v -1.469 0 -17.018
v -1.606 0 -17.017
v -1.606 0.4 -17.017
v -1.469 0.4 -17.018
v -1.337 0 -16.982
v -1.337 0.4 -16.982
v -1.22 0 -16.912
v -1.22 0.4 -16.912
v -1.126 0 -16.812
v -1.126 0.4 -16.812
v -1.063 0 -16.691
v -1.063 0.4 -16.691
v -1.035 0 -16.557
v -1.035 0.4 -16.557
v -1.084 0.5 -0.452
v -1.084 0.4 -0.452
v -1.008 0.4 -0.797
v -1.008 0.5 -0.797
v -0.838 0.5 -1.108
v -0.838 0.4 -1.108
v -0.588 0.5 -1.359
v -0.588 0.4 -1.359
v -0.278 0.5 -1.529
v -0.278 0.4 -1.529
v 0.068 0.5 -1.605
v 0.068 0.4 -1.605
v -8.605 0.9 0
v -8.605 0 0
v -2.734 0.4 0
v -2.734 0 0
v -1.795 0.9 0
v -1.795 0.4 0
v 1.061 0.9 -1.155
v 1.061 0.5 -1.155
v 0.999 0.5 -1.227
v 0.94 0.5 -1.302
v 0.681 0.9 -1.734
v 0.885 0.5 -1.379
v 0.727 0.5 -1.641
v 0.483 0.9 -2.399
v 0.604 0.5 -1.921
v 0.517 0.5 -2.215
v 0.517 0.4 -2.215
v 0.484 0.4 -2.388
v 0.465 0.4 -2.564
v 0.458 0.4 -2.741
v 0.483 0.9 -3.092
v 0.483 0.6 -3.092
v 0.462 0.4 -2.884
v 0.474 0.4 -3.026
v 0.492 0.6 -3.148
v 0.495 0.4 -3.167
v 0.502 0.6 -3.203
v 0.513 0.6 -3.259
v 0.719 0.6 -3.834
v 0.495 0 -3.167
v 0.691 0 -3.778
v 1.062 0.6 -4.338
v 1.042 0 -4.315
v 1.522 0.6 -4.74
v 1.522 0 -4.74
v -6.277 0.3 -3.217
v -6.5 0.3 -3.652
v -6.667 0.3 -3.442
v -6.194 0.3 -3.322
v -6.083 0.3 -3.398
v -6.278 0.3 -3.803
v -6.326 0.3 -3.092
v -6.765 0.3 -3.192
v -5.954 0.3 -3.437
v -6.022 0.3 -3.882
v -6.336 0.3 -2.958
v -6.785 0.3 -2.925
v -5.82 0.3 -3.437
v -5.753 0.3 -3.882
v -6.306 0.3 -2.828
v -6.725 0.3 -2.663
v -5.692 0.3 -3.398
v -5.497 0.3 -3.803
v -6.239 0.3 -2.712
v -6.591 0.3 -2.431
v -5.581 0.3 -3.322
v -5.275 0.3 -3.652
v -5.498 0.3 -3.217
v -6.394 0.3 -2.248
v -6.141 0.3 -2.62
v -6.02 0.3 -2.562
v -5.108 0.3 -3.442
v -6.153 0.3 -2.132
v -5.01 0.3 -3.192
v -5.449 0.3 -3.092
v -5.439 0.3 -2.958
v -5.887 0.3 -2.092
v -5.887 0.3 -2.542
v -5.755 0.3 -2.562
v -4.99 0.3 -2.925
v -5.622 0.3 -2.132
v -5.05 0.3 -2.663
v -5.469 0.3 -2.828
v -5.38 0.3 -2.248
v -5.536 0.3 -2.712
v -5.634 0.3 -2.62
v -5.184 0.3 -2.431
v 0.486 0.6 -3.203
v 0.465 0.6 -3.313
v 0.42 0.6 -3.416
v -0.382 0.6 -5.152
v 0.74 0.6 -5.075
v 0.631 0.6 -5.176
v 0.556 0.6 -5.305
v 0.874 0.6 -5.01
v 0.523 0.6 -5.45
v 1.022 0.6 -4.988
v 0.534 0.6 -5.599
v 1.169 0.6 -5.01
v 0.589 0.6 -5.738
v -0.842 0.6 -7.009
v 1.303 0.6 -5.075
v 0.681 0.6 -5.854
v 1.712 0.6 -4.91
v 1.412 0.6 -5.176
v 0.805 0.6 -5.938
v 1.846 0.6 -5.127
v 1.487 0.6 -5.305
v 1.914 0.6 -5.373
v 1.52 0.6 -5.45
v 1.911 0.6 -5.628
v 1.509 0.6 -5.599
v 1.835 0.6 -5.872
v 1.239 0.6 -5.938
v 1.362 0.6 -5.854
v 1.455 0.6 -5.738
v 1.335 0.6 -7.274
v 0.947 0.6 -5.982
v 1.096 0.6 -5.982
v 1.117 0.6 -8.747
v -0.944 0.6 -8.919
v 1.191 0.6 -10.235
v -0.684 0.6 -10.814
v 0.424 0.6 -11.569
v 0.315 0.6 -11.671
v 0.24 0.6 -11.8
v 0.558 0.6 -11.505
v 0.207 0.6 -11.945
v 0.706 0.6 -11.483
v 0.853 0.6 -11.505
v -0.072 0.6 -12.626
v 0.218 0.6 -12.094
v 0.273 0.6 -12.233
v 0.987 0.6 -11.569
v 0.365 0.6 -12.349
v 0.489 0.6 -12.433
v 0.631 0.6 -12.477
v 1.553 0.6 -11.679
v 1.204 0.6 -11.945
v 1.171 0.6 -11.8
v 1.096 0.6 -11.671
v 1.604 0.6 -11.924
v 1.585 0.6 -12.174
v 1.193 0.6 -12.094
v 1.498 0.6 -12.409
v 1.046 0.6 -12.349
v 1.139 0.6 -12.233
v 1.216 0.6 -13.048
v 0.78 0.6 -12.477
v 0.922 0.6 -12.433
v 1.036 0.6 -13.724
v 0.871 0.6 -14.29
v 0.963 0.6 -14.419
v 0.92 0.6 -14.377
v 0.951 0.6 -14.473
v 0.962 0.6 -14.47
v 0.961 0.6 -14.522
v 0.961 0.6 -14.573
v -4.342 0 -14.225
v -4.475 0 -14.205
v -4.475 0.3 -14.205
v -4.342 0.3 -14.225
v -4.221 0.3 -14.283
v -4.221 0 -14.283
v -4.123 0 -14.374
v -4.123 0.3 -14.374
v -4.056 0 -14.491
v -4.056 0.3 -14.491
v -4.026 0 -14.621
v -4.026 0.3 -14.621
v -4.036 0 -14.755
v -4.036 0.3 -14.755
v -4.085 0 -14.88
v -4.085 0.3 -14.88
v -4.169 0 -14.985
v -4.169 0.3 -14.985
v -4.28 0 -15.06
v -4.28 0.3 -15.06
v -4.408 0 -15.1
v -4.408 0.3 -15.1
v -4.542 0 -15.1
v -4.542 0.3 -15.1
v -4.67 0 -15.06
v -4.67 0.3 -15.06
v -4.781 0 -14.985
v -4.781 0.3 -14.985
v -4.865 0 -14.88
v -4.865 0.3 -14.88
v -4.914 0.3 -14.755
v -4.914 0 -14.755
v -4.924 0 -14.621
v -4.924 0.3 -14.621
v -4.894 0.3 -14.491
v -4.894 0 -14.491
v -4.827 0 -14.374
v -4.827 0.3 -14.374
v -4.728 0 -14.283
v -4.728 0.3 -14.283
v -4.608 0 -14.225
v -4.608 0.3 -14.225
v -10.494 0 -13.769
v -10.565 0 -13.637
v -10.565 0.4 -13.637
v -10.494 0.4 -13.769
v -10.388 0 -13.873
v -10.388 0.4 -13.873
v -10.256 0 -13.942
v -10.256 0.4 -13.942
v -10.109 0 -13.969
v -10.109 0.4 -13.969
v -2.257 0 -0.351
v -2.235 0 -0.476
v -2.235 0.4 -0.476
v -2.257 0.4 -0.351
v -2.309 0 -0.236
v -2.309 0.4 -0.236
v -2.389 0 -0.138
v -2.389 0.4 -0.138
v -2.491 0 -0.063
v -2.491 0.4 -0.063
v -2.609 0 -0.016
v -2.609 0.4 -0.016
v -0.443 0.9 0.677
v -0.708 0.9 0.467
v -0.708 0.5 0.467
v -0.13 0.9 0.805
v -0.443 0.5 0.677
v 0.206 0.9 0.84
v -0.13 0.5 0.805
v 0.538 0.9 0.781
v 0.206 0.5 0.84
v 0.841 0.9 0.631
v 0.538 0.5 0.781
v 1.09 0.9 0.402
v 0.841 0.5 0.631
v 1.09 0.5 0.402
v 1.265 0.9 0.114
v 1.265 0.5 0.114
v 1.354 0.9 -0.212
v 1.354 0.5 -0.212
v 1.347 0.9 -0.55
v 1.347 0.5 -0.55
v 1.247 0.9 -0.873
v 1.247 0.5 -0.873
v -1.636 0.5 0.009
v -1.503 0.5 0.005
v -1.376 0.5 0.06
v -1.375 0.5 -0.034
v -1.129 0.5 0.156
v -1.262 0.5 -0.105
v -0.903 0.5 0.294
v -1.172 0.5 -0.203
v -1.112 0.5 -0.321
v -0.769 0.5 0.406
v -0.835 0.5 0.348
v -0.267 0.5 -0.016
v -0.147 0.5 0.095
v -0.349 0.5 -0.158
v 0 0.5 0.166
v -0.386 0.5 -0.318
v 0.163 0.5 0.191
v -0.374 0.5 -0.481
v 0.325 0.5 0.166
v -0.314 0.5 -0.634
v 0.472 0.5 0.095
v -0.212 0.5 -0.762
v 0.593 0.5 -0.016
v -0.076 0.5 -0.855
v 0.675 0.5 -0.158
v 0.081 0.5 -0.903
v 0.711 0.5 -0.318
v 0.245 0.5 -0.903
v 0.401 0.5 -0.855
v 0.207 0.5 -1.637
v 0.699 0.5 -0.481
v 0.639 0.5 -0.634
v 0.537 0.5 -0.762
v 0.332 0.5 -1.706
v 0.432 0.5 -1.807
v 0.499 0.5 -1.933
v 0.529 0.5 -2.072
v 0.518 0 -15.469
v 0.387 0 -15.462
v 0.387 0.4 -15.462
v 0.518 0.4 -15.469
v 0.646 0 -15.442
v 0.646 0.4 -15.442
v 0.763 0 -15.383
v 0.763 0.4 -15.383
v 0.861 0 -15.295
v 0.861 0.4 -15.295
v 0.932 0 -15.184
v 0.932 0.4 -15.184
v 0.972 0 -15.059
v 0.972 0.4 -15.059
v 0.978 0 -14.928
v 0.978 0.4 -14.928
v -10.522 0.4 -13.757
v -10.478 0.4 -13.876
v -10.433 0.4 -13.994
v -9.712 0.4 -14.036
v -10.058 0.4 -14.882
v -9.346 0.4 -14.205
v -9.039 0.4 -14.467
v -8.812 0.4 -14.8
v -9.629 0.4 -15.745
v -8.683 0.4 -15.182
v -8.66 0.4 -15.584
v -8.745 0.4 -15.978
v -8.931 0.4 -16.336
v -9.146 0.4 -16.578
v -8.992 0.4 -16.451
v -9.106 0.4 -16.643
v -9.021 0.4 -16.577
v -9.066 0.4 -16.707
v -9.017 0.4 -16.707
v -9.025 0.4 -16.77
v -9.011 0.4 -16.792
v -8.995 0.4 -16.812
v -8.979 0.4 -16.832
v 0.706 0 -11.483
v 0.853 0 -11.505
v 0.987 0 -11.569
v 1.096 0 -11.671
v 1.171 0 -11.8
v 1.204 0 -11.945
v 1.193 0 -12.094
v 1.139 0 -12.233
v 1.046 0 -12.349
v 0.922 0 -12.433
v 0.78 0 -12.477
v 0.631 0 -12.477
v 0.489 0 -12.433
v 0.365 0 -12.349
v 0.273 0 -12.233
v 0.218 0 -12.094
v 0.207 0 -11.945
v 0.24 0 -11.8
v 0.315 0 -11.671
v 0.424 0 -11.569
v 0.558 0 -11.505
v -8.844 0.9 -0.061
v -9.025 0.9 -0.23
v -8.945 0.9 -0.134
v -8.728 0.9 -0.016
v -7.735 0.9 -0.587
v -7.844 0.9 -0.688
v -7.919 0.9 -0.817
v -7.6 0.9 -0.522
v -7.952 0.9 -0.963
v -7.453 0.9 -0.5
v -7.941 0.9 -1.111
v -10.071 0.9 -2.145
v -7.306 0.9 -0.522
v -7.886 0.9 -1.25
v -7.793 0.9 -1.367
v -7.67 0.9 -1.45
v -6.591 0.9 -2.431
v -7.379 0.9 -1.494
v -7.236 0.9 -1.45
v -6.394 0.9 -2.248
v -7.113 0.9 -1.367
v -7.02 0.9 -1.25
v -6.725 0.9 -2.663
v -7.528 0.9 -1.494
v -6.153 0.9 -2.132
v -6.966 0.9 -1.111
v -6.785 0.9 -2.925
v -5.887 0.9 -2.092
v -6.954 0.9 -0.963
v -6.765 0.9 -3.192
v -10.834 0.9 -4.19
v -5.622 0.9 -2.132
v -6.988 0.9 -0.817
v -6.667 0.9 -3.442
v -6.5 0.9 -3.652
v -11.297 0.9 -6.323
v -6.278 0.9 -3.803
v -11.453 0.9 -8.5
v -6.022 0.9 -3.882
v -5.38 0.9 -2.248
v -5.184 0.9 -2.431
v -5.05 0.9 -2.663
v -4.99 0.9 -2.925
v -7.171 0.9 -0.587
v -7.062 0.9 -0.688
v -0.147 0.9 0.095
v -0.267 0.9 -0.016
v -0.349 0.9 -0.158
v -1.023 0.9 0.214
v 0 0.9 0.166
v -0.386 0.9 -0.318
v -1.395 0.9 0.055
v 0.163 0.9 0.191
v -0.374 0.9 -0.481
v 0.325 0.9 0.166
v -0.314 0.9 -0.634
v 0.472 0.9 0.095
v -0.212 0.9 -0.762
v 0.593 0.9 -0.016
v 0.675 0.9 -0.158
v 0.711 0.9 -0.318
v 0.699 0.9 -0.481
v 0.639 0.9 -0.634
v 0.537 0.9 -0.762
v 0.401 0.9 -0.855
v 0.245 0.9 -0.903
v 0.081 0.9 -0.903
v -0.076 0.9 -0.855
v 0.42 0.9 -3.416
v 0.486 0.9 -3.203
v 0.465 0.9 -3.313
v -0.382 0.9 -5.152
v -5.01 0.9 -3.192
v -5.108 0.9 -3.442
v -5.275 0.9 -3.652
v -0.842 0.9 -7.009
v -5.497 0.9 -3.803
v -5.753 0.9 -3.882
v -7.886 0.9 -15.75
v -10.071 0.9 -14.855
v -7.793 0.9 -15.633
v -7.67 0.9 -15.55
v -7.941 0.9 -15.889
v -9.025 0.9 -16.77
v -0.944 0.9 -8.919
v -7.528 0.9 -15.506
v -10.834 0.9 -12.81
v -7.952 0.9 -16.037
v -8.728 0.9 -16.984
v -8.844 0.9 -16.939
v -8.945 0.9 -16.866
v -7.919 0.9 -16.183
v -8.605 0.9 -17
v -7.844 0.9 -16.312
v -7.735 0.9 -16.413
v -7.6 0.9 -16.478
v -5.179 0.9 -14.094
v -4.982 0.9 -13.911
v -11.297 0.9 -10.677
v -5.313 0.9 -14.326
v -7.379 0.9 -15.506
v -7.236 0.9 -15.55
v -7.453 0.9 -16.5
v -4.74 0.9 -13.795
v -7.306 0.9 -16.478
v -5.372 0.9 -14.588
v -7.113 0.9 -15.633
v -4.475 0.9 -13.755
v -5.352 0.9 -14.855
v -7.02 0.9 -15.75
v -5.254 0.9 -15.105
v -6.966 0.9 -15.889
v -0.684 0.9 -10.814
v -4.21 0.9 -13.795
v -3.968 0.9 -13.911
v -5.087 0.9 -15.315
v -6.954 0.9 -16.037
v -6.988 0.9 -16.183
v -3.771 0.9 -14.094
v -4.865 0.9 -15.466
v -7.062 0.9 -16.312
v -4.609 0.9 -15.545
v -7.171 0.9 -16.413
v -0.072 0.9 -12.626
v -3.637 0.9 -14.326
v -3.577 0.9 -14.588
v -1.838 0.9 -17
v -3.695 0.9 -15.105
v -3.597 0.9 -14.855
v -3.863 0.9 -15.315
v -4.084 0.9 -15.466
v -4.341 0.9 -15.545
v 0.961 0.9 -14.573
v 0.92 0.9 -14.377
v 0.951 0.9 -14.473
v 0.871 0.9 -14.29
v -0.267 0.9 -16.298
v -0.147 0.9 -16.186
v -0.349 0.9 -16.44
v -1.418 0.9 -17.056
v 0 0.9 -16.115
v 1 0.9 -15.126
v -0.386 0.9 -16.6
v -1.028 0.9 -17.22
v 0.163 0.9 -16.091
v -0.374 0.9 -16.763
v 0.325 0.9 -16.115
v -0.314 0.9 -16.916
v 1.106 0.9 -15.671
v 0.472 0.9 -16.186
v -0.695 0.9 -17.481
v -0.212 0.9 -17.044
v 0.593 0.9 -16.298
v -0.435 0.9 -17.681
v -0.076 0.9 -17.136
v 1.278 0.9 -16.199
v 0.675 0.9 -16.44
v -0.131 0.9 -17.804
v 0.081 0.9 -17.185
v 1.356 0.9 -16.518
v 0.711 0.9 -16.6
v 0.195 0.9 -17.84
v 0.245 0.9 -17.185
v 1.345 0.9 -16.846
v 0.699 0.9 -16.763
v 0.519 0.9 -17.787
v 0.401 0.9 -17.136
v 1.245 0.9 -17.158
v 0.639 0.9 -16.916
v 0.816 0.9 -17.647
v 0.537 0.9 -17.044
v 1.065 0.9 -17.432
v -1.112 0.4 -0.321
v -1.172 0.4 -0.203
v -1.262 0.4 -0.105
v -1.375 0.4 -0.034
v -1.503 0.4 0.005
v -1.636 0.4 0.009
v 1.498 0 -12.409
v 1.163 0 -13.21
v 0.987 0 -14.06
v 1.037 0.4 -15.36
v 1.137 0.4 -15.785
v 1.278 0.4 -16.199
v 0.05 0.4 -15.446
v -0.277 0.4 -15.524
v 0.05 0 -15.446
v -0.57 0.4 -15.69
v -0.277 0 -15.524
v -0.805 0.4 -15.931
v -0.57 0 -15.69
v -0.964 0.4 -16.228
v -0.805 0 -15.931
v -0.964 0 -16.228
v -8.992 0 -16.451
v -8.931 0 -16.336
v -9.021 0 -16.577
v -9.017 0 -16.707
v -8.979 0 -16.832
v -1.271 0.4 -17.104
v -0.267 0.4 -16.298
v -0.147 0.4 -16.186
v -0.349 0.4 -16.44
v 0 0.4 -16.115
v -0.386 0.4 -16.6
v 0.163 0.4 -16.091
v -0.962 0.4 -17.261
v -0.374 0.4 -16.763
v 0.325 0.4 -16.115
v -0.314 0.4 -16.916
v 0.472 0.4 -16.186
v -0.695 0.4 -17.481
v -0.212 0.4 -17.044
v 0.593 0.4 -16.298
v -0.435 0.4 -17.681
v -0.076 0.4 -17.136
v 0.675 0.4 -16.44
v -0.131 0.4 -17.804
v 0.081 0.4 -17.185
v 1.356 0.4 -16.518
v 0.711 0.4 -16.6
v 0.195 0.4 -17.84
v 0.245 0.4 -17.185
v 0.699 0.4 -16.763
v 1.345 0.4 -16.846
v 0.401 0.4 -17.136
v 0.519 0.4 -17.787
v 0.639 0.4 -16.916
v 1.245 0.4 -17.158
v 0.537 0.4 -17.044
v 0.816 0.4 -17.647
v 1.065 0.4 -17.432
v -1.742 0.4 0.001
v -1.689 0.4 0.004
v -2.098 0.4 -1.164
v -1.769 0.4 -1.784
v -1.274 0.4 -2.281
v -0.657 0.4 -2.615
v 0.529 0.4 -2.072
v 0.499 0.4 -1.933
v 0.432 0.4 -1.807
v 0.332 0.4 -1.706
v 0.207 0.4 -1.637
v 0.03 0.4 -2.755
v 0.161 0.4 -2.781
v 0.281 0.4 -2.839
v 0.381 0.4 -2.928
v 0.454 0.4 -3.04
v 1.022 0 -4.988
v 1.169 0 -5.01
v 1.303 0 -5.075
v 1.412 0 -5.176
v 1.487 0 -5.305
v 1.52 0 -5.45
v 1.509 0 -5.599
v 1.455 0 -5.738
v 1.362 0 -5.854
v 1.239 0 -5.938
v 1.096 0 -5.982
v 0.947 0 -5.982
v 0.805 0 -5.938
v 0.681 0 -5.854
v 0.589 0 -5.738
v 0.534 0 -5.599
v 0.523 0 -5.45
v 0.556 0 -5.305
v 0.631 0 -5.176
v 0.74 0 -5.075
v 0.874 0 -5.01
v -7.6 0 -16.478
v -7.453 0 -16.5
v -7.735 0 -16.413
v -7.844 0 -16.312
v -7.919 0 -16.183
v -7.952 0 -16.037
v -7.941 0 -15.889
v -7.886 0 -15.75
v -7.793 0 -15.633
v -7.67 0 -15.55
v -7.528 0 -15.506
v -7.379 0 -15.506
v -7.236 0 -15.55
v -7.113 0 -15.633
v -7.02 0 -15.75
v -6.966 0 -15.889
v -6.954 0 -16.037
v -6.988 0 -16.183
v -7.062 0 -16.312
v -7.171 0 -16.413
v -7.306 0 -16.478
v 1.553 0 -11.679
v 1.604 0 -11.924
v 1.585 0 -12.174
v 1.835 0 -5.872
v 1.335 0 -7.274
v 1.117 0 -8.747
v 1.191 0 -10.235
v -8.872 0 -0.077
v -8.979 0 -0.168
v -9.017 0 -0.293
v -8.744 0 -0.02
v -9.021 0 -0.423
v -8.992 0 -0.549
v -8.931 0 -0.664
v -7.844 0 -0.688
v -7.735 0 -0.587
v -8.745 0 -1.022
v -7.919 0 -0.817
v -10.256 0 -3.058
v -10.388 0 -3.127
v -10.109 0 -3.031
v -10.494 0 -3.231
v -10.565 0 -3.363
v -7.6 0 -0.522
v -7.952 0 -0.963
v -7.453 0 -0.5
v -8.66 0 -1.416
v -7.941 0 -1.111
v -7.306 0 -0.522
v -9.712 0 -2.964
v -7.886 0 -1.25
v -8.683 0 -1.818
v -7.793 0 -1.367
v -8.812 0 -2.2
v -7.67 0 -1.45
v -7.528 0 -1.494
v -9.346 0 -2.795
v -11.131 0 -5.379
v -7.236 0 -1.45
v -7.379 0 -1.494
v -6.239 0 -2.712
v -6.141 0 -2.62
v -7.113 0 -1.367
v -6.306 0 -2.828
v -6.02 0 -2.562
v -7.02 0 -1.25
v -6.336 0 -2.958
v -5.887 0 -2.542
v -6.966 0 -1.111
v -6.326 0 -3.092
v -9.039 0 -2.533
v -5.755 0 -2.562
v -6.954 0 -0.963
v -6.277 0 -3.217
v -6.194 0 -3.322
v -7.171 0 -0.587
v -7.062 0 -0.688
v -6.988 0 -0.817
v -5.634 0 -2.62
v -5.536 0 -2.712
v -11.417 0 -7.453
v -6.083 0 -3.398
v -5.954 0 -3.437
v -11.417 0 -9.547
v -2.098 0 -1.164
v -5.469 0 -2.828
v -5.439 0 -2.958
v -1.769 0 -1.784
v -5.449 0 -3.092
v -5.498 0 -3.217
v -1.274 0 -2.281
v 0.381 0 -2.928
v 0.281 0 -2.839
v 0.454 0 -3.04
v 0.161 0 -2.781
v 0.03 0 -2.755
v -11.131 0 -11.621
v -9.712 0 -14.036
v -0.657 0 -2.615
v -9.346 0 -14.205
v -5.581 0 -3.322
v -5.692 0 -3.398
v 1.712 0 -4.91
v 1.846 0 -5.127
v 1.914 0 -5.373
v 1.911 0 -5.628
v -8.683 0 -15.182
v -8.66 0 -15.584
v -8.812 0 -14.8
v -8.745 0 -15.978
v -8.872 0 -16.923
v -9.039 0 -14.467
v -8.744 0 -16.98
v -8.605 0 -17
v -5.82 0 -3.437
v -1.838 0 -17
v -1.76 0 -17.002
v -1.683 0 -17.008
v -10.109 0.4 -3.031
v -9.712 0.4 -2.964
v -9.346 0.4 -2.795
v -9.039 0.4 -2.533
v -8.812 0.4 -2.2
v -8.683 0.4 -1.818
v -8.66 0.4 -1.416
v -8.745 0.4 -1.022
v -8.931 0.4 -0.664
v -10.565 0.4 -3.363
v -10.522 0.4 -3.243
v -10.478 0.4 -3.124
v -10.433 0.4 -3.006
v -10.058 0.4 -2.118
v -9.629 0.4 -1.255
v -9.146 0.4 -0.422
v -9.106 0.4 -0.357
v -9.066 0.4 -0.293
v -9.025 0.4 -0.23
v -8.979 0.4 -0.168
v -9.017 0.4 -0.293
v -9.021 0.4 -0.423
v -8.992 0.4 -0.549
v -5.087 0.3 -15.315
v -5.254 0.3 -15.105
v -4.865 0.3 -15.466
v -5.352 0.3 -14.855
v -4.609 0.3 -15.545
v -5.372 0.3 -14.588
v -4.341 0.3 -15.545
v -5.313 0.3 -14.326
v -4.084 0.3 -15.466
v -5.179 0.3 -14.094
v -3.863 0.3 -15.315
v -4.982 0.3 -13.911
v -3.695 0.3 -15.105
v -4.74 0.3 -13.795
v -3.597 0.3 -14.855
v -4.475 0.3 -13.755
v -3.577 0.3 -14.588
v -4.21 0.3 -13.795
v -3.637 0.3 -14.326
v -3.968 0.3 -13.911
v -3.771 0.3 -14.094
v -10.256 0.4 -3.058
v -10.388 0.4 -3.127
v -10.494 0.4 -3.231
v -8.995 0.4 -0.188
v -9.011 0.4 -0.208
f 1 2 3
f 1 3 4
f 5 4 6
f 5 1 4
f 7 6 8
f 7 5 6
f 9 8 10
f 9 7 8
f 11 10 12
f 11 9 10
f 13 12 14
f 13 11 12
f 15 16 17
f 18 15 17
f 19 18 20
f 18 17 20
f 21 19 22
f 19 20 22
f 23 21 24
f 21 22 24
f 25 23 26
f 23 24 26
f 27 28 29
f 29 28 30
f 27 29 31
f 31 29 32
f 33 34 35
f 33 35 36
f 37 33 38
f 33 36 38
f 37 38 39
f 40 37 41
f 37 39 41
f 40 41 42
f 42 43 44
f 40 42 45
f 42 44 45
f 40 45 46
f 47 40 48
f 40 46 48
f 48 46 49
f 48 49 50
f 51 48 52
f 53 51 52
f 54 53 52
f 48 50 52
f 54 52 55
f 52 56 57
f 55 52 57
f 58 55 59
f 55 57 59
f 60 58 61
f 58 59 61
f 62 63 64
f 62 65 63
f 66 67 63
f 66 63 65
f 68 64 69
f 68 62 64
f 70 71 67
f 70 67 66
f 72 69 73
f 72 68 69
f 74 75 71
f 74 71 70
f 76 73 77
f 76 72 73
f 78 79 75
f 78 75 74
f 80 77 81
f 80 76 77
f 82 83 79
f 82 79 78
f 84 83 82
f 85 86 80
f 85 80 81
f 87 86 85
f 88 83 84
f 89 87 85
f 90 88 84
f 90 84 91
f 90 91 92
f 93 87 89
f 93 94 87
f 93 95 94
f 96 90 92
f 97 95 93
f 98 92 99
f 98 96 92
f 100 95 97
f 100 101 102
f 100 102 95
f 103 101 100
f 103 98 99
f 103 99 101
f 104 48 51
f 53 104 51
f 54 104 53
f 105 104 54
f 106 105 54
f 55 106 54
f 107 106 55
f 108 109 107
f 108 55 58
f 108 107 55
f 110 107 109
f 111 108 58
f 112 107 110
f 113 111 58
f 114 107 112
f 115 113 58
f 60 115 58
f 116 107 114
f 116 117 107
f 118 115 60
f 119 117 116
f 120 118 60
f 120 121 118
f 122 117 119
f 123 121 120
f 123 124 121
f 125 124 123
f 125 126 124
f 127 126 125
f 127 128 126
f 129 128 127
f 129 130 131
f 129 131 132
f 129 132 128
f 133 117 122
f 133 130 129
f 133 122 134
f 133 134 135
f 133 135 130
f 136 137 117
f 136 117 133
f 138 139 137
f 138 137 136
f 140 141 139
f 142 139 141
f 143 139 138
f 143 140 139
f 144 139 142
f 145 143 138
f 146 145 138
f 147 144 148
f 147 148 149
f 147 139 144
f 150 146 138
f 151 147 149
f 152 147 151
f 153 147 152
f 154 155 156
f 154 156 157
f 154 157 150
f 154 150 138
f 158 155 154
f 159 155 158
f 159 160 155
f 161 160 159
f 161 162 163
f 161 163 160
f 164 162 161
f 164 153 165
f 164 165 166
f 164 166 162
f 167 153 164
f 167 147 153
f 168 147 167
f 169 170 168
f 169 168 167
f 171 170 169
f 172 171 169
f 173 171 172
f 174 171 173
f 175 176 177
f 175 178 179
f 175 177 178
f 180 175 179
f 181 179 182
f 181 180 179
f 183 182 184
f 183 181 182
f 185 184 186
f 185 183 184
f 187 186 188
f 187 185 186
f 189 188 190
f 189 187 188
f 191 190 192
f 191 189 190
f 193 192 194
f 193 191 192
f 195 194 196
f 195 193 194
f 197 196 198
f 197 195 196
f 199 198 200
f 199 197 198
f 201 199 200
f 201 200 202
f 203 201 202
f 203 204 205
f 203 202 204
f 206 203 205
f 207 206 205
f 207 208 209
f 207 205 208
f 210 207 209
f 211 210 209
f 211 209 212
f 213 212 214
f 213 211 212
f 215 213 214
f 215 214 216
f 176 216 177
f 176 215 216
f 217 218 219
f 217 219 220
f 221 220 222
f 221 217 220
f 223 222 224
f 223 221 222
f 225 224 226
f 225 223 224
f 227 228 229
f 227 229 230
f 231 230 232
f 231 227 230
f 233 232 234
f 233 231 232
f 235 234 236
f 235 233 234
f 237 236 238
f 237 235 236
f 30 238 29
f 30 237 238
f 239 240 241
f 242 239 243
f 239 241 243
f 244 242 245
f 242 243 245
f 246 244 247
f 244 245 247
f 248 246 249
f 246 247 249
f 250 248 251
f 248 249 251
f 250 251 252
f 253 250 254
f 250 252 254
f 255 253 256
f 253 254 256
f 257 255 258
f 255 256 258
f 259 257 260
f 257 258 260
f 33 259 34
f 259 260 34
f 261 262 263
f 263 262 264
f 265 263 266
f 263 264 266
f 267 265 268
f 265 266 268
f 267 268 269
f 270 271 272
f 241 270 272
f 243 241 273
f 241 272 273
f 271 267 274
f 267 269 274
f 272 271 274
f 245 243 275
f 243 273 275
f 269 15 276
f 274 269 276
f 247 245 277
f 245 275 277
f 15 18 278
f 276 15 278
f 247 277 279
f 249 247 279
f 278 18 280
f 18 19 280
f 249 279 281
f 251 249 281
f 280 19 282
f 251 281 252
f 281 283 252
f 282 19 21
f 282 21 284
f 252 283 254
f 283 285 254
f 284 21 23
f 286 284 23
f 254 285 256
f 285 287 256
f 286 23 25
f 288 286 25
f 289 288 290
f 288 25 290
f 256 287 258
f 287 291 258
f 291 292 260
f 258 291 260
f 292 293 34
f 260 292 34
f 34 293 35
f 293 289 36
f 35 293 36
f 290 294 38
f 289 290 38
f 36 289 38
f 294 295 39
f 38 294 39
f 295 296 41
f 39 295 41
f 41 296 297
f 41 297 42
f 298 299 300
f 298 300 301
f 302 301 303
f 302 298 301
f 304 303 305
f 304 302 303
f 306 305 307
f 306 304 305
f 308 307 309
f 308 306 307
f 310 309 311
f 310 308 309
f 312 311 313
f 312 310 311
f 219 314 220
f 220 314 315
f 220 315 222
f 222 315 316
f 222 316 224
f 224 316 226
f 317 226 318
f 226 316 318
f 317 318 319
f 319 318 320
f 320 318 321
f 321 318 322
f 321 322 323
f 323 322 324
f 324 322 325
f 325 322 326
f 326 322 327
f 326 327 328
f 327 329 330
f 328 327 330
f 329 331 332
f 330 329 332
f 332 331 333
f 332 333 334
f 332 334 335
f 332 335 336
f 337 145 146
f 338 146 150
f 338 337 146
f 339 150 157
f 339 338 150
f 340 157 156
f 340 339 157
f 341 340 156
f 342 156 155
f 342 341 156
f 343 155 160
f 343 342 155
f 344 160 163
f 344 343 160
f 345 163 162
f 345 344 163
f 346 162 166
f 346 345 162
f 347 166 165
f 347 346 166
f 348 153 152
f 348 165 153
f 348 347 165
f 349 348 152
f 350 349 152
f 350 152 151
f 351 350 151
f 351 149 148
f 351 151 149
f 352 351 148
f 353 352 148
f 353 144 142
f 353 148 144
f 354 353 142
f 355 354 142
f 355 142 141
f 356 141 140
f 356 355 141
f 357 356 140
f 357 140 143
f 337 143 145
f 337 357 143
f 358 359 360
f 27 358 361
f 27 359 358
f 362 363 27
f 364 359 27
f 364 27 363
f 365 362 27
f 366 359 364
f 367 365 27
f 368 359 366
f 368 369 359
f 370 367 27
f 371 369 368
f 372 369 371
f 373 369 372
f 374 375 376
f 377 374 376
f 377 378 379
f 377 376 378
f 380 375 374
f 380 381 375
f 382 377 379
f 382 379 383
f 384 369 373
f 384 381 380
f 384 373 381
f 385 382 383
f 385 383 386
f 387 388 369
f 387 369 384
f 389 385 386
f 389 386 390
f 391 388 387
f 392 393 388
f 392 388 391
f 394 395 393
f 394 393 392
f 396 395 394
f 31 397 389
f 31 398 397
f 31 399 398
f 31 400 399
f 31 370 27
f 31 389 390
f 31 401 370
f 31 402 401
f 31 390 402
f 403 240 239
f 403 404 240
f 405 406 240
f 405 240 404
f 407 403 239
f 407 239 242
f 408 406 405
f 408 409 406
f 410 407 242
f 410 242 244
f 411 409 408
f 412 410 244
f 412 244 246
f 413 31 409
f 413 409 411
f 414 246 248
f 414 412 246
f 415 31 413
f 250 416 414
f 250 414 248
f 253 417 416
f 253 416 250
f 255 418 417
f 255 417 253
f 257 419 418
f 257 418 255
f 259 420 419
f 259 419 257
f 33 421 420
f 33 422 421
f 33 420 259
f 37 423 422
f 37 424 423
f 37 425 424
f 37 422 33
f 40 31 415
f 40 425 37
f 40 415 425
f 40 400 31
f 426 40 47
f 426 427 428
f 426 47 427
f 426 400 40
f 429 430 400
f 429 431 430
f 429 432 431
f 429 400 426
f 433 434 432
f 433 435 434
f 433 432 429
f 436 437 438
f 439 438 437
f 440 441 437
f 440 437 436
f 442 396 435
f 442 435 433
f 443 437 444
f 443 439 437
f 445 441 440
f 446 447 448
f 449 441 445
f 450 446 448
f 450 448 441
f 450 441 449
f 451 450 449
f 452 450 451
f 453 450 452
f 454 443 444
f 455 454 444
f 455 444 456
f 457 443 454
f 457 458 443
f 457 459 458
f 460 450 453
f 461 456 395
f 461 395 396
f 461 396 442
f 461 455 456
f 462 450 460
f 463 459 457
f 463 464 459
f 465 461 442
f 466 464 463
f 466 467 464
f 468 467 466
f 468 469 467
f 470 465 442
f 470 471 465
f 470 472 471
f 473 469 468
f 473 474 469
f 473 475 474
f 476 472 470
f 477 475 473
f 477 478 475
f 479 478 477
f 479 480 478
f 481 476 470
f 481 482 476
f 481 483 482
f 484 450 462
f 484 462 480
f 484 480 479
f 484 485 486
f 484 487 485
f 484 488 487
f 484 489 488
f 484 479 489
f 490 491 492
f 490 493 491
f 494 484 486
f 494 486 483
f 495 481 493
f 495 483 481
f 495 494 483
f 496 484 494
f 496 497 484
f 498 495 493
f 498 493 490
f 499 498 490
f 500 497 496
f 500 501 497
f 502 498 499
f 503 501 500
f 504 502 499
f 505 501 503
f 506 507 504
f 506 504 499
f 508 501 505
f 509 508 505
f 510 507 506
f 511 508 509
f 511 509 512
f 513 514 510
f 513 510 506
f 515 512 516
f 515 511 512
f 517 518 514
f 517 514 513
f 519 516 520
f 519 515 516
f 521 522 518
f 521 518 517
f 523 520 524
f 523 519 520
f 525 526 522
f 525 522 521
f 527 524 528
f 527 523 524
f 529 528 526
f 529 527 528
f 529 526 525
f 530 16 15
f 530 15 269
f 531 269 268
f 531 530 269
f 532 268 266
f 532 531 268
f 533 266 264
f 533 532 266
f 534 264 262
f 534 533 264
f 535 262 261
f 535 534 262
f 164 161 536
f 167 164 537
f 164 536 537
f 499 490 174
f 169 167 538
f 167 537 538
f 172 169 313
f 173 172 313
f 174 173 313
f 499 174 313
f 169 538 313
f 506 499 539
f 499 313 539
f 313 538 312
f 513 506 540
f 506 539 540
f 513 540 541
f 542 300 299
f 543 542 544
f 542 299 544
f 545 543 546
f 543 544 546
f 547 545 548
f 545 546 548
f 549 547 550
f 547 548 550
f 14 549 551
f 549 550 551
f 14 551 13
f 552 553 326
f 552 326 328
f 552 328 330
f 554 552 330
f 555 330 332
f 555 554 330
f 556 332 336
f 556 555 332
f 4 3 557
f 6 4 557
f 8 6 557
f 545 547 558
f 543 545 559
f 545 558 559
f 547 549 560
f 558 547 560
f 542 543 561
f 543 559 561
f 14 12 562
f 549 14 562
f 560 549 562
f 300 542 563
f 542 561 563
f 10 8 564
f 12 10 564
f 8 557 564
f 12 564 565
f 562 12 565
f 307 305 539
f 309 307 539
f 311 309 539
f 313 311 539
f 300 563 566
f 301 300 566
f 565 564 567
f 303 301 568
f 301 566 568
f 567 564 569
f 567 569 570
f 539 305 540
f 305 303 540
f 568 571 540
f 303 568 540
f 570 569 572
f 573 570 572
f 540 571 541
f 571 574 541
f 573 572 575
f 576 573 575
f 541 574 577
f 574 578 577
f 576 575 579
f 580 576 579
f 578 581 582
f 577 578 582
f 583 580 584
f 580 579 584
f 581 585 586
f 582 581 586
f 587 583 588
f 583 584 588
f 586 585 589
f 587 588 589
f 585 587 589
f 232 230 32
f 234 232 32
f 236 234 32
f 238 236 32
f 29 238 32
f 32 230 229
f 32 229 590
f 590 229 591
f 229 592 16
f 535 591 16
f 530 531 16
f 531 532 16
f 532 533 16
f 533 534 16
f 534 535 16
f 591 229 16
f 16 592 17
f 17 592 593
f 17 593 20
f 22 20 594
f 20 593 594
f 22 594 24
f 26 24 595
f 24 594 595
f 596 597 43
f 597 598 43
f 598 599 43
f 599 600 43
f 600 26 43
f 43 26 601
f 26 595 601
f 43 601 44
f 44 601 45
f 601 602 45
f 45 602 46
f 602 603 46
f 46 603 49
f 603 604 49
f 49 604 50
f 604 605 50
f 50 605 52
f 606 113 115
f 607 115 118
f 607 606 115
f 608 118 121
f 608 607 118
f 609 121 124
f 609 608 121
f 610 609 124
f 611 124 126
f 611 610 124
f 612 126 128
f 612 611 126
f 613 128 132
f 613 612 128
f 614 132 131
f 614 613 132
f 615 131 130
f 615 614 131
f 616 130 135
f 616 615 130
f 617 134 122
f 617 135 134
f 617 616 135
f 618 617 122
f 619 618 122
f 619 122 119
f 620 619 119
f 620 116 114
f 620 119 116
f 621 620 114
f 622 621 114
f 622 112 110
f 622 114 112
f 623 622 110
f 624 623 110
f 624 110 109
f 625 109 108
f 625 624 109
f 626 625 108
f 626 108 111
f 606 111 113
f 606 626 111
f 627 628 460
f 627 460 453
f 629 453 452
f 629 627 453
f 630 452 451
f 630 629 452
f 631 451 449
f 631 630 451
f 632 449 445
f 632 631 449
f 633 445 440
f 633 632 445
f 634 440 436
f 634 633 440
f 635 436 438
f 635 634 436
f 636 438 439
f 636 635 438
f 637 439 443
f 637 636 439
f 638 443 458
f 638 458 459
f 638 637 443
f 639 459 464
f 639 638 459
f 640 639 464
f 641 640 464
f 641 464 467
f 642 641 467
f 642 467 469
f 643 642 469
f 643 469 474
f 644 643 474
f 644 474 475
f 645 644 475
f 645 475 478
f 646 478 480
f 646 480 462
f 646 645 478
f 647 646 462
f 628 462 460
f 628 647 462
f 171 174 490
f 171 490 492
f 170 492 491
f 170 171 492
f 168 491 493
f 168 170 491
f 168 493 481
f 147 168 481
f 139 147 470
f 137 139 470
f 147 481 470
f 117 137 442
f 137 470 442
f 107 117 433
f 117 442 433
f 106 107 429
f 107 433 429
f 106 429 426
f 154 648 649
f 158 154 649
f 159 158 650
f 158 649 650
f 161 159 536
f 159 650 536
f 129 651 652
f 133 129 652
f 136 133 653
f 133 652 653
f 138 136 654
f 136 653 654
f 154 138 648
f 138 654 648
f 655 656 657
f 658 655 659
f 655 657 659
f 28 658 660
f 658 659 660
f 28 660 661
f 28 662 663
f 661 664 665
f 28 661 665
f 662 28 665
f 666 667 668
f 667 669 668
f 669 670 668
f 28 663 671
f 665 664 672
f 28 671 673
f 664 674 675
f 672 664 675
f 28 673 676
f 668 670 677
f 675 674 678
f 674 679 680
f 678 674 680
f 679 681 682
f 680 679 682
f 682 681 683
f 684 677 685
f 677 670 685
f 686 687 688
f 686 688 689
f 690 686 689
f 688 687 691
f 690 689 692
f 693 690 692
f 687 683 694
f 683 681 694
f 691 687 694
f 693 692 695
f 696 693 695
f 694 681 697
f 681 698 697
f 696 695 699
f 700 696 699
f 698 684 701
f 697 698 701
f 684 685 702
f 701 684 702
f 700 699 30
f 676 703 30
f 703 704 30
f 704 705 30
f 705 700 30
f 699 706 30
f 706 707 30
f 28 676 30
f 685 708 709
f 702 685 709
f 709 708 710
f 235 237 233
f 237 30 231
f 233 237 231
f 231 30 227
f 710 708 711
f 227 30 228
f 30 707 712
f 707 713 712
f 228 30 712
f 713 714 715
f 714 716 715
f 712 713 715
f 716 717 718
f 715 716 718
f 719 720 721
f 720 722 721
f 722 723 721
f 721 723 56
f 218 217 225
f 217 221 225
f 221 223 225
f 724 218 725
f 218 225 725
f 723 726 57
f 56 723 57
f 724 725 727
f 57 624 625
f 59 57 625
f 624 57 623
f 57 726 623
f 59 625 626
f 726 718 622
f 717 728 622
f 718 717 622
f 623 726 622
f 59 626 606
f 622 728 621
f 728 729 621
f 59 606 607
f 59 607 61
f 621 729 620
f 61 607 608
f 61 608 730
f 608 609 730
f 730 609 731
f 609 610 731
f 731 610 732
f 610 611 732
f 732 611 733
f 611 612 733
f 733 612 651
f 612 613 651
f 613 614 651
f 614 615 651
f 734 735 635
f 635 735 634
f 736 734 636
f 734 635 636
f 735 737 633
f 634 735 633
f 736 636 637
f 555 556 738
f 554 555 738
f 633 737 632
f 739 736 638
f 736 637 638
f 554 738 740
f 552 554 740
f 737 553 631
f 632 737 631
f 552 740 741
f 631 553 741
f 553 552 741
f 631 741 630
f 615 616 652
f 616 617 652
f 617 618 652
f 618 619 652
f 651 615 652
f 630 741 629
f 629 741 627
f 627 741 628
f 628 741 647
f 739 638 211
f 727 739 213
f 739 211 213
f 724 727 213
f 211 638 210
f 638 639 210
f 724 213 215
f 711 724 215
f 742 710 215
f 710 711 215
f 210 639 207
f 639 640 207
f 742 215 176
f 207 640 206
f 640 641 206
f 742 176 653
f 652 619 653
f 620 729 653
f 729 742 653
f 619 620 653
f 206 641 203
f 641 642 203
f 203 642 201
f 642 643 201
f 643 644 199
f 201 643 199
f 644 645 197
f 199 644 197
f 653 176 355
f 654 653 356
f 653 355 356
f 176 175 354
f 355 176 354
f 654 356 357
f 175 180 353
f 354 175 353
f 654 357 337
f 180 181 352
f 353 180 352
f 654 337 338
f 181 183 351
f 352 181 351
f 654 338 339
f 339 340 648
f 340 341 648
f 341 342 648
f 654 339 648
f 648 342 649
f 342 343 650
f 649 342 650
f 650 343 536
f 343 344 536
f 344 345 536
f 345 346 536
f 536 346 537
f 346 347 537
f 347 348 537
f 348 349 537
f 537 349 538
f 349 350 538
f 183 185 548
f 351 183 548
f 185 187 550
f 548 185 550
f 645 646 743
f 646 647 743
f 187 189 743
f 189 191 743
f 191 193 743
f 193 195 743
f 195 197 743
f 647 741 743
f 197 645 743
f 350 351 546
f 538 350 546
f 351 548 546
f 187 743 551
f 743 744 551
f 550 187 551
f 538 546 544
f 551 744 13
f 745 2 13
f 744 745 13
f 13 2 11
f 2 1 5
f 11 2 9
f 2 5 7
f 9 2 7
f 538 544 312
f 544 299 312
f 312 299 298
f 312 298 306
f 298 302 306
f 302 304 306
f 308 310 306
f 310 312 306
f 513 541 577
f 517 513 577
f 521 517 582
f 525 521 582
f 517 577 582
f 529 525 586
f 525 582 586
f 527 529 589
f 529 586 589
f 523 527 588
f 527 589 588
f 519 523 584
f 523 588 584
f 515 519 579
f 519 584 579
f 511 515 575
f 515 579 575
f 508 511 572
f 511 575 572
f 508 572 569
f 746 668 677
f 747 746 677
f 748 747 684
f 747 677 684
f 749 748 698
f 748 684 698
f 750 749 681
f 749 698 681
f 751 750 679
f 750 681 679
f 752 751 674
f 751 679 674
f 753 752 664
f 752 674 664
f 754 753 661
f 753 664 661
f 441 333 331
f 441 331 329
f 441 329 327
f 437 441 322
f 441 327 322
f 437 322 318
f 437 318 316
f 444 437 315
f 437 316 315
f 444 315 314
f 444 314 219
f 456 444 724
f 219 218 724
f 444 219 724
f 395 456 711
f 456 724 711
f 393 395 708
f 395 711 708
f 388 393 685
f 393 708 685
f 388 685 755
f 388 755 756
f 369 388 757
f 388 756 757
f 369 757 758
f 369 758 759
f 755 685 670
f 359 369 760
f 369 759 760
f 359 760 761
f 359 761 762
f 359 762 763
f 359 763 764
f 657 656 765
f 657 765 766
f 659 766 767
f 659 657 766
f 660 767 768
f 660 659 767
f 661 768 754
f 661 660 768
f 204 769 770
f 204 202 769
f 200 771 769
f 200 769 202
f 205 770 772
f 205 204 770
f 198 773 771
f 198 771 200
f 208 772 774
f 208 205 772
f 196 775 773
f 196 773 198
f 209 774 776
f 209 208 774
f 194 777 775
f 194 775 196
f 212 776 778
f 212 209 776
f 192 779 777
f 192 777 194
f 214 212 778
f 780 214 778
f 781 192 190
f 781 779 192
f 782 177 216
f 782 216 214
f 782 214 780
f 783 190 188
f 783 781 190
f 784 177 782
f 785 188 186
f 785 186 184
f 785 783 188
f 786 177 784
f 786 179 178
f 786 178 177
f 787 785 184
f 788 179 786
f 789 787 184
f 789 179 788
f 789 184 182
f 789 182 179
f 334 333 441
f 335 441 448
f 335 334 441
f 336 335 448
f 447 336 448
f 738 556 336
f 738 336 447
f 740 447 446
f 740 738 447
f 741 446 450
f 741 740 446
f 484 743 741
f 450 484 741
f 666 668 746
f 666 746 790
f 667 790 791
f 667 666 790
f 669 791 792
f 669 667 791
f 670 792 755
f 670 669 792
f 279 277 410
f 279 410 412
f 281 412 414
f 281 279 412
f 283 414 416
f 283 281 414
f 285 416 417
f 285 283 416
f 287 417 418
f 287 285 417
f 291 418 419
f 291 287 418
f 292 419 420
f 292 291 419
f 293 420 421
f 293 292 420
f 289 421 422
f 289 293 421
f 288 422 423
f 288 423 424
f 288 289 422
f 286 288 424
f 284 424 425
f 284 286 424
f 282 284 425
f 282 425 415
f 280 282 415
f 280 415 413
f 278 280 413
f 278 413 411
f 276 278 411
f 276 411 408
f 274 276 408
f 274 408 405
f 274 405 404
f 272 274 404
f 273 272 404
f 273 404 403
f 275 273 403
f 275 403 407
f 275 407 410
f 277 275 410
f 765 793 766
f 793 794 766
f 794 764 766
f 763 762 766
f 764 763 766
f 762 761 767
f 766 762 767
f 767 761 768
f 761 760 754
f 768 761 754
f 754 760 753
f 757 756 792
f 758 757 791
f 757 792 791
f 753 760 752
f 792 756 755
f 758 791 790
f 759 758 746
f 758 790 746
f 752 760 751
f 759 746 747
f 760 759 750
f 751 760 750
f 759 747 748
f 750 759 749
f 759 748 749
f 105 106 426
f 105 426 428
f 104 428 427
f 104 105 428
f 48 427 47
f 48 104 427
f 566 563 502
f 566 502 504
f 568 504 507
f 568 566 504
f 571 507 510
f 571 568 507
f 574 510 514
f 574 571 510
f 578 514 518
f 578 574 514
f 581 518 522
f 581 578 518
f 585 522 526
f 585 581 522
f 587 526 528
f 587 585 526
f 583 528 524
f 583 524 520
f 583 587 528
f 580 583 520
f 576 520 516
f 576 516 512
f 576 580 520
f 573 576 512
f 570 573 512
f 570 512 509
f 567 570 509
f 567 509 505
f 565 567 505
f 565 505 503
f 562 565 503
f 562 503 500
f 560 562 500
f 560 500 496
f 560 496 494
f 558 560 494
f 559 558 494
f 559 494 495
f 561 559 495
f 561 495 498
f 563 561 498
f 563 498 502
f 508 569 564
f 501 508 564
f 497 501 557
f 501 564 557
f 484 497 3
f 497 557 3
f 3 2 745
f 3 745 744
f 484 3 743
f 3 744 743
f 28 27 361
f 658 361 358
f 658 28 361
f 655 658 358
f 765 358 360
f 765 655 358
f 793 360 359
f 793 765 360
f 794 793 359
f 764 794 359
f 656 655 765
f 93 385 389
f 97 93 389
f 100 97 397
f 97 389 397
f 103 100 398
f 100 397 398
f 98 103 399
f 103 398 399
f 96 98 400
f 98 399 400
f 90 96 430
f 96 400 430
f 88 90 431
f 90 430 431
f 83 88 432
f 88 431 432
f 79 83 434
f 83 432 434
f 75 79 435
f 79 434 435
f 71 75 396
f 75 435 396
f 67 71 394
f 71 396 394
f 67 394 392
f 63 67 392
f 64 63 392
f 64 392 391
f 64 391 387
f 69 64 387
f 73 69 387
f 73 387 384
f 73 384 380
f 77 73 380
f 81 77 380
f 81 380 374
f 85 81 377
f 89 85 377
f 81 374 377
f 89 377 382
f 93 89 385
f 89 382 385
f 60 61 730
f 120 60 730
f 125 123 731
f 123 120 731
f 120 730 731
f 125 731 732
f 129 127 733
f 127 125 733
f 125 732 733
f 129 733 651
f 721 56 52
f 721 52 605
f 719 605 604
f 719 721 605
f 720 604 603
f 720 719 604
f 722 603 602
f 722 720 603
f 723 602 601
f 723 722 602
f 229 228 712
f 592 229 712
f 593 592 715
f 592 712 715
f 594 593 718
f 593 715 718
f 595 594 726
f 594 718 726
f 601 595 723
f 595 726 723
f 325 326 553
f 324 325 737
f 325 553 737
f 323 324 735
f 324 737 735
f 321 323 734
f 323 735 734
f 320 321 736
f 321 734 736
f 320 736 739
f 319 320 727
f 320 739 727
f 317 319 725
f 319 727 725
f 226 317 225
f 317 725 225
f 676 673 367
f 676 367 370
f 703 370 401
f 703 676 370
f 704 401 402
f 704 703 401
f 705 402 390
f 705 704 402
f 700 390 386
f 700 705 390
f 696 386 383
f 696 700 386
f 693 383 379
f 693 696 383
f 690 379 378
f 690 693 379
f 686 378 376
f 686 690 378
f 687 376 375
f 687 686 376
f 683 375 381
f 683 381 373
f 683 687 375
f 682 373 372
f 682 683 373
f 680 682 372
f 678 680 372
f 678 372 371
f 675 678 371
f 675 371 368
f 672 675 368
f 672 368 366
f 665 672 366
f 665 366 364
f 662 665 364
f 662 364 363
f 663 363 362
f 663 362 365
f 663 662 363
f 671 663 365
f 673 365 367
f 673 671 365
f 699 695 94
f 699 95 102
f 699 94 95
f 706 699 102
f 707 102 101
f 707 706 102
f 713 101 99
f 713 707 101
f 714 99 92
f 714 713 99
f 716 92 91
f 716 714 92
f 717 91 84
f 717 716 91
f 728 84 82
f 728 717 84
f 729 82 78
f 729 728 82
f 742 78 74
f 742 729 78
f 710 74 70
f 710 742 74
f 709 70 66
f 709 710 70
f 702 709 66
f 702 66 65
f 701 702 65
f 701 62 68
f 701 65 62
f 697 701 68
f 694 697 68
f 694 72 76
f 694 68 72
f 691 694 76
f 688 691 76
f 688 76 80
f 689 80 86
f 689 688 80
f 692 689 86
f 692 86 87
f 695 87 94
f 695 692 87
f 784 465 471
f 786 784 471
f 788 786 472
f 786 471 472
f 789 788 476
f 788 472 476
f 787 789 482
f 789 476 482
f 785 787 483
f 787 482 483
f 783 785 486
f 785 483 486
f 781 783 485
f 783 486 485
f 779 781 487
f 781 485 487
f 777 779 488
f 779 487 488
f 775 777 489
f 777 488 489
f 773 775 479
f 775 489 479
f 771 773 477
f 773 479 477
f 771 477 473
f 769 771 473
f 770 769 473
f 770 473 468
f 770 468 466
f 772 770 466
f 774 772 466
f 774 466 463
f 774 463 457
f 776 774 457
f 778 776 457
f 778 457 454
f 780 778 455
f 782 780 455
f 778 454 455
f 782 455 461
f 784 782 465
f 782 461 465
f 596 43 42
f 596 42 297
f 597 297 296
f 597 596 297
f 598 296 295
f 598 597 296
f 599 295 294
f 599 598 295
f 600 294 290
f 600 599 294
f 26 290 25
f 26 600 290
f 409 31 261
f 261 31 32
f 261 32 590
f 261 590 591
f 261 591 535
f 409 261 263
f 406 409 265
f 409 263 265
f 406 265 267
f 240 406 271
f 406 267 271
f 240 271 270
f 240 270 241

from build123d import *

# Parameters (mm, degrees)
SKETCH_1_R          = 0.5
SKETCH_1_R_2        = 0.55
SKETCH_1_R_3        = 0.45
EXTRUDE_1_DEPTH     = 0.9
SKETCH_2_R          = 10.1
CUT_EXTRUDE_1_DEPTH = 0.3
SKETCH_3_R          = 2.4
SKETCH_3_R_2        = 1.5
CUT_EXTRUDE_2_DEPTH = 0.4
SKETCH_4_R          = 1.25
CUT_EXTRUDE_3_DEPTH = 0.1
SKETCH_5_R          = 0.9
CUT_EXTRUDE_4_DEPTH = 0.6
SKETCH_6_R          = 1.2
CUT_EXTRUDE_5_DEPTH = 0.4
FILLET_START        = -1
FILLET_1_DEPTH      = 1.4
FILLET_START_2      = 0.4
FILLET_1_2_DEPTH    = 0.1
FILLET_START_3      = 0.5
FILLET_1_3_DEPTH    = 1.5
FILLET_START_4      = 0.6
FILLET_1_4_DEPTH    = 1.4


with BuildPart() as part:
    # Эскиз1 → Бобышка-Вытянуть1 (new body)
    with BuildSketch(Plane(origin=(0, 0, 0), x_dir=(1, 0, 0), z_dir=(0, 1, 0))):
        with BuildLine():
            Line((-8.874701271, 0), (-1.795461863, 0))
            ThreePointArc((-1.795461863, 0), (-1.203537037, -0.121731158), (-0.70768647, -0.467166667))
            ThreePointArc((-0.70768647, -0.467166667), (0.973552797, -0.525347996), (1.060942394, 1.154626289))
            ThreePointArc((1.060942394, 1.154626289), (0.477391661, 3.052026669), (1.522351258, 4.739841558))
            ThreePointArc((1.522351258, 4.739841558), (1.889015496, 5.247769663), (1.835416111, 5.871917665))
            ThreePointArc((1.835416111, 5.871917665), (1.116849218, 8.747445681), (1.55283729, 11.679154083))
            ThreePointArc((1.55283729, 11.679154083), (1.603016133, 12.049823116), (1.498169999, 12.408878456))
            ThreePointArc((1.498169999, 12.408878456), (0.968934134, 14.279432184), (1.278077174, 16.198674855))
            ThreePointArc((1.278077174, 16.198674855), (0.816325951, 17.647158357), (-0.694815473, 17.480514286))
            ThreePointArc((-0.694815473, 17.480514286), (-1.217938679, 17.125012349), (-1.837947895, 17))
            Line((-1.837947895, 17), (-8.874701271, 17))
            ThreePointArc((-8.874701271, 17), (-11.453066156, 8.5), (-8.874701271, 0))
        make_face()
        with Locations(Location((1.021573168, 5.487652568, 0), (0, 0, 270))):
            Circle(SKETCH_1_R, mode=Mode.SUBTRACT)
        with Locations(Location((0.162533844, 0.3591, 0), (0, 0, 270))):
            Circle(SKETCH_1_R_2, mode=Mode.SUBTRACT)
        with Locations(Location((-5.887426867, 2.992111817, 0), (0, 0, 270))):
            Circle(SKETCH_1_R_3, mode=Mode.SUBTRACT)
        with Locations(Location((-7.453066156, 1, 0), (0, 0, 270))):
            Circle(SKETCH_1_R, mode=Mode.SUBTRACT)
        with Locations(Location((-4.474879967, 14.65491132, 0), (0, 0, 270))):
            Circle(SKETCH_1_R_3, mode=Mode.SUBTRACT)
        with Locations(Location((-7.453066156, 16, 0), (0, 0, 90))):
            Circle(SKETCH_1_R, mode=Mode.SUBTRACT)
        with Locations(Location((0.705531067, 11.982588035, 0), (0, 0, 270))):
            Circle(SKETCH_1_R, mode=Mode.SUBTRACT)
        with Locations(Location((0.162533844, 16.6409, 0), (0, 0, 270))):
            Circle(SKETCH_1_R_2, mode=Mode.SUBTRACT)
    extrude(amount=EXTRUDE_1_DEPTH)

    # Эскиз2 → Вырез-Вытянуть1 (cut)
    with BuildSketch(Plane(origin=(0, 0.9, 0), x_dir=(1, 0, 0), z_dir=(0, 1, 0))):
        with Locations((9.146933844, 8.5)):
            Circle(SKETCH_2_R)
    extrude(amount=-CUT_EXTRUDE_1_DEPTH, mode=Mode.SUBTRACT)

    # Эскиз3 → Вырез-Вытянуть2 (cut)
    with BuildSketch(Plane.XZ):
        with Locations((0.162533844, -0.3591)):
            Circle(SKETCH_3_R)
        with Locations((-10.155327835, -1.531617514)):
            Circle(SKETCH_3_R_2)
        with Locations((-10.155327835, -15.468382486)):
            Circle(SKETCH_3_R_2)
    extrude(amount=-CUT_EXTRUDE_2_DEPTH, mode=Mode.SUBTRACT)

    # Эскиз4 → Вырез-Вытянуть3 (cut)
    with BuildSketch(Plane.XZ.offset(-0.4)):
        with Locations((0.162533844, -0.3591)):
            Circle(SKETCH_4_R)
    extrude(amount=-CUT_EXTRUDE_3_DEPTH, mode=Mode.SUBTRACT)

    # Эскиз5 → Вырез-Вытянуть4 (cut)
    with BuildSketch(Plane(origin=(0, 0.9, 0), x_dir=(1, 0, 0), z_dir=(0, 1, 0))):
        with Locations(Location((-5.887426867, 2.992111817, 0), (0, 0, 270))):
            Circle(SKETCH_5_R)
        with Locations(Location((-4.474879967, 14.65491132, 0), (0, 0, 270))):
            Circle(SKETCH_5_R)
    extrude(amount=-CUT_EXTRUDE_4_DEPTH, mode=Mode.SUBTRACT)

    # Эскиз6 → Вырез-Вытянуть5 (cut)
    with BuildSketch(Plane.XZ):
        with Locations((0.162533844, -16.6409)):
            Circle(SKETCH_6_R)
    extrude(amount=-CUT_EXTRUDE_5_DEPTH, mode=Mode.SUBTRACT)

    # Скругление1: read off the stored shape, not the designer's step
    # Скругление1 outline → Скругление1 (cut)
    with BuildSketch(Plane(origin=(0, 0, 0), x_dir=(1, 0, 0), z_dir=(0, 1, 0)).offset(FILLET_START)):
        with BuildLine():
            ThreePointArc((-10.564834765, 13.6372099), (-10.388255808, 13.873471068), (-10.10922841, 13.969091039))
            ThreePointArc((-10.10922841, 13.969091039), (-10.271568069, 13.972893199), (-10.432545463, 13.994221577))
            ThreePointArc((-10.432545463, 13.994221577), (-10.499800665, 13.816127249), (-10.564834765, 13.6372099))
        make_face()
        with BuildLine():
            ThreePointArc((-9.146480388, 16.578439614), (-9.032397619, 16.462881218), (-8.931474904, 16.335667907))
            ThreePointArc((-8.931474904, 16.335667907), (-9.021275661, 16.577400508), (-8.978676793, 16.831731322))
            ThreePointArc((-8.978676793, 16.831731322), (-8.809674916, 16.955996525), (-8.604572089, 17))
            Line((-8.604572089, 17), (-8.874701271, 17))
            ThreePointArc((-8.874701271, 17), (-8.950481675, 16.885472917), (-9.025231073, 16.77027027))
            ThreePointArc((-9.025231073, 16.77027027), (-9.086211401, 16.674579749), (-9.146480388, 16.578439614))
        make_face()
        with BuildLine():
            ThreePointArc((-10.10922841, 3.030908961), (-10.388255808, 3.126528932), (-10.564834765, 3.3627901))
            ThreePointArc((-10.564834765, 3.3627901), (-10.499800665, 3.183872751), (-10.432545462, 3.005778423))
            ThreePointArc((-10.432545462, 3.005778423), (-10.271568069, 3.027106801), (-10.10922841, 3.030908961))
        make_face()
        with BuildLine():
            ThreePointArc((-8.978676793, 0.168268678), (-9.021275661, 0.422599492), (-8.931474903, 0.664332093))
            ThreePointArc((-8.931474903, 0.664332093), (-9.032397619, 0.537118782), (-9.146480388, 0.421560386))
            ThreePointArc((-9.146480388, 0.421560386), (-9.086211401, 0.325420251), (-9.025231073, 0.22972973))
            ThreePointArc((-9.025231073, 0.22972973), (-8.950481675, 0.114527083), (-8.874701271, 0))
            Line((-8.874701271, 0), (-8.604572089, 0))
            ThreePointArc((-8.604572089, 0), (-8.809674916, 0.044003475), (-8.978676793, 0.168268678))
        make_face()
        with BuildLine():
            ThreePointArc((-0.694815473, 17.480514286), (-1.112314109, 17.17400715), (-1.605848887, 17.016923865))
            ThreePointArc((-1.605848887, 17.016923865), (-1.219826633, 16.911729191), (-1.034538008, 16.557120639))
            ThreePointArc((-1.034538008, 16.557120639), (-0.963665757, 17.055236166), (-0.694815473, 17.480514286))
        make_face()
        with BuildLine():
            ThreePointArc((-2.234631739, 0.475706897), (-2.389183693, 0.137959566), (-2.734041235, 0))
            Line((-2.734041235, 0), (-2.210448918, 0))
            ThreePointArc((-2.210448918, 0), (-2.23437105, 0.237252027), (-2.234631739, 0.475706897))
        make_face()
        with BuildLine():
            ThreePointArc((1.278077174, 16.198674855), (0.926926141, 15.715857074), (0.386577368, 15.462000301))
            ThreePointArc((0.386577368, 15.462000301), (0.815072231, 15.341843176), (0.978072419, 14.92774594))
            ThreePointArc((0.978072419, 14.92774594), (1.081728132, 15.5741506), (1.278077174, 16.198674855))
        make_face()
        with BuildLine():
            ThreePointArc((0.030324762, 2.755455725), (0.244370036, 2.757704352), (0.457764308, 2.740872234))
            ThreePointArc((0.457764308, 2.740872234), (0.466881934, 2.954735051), (0.495018839, 3.16693484))
            ThreePointArc((0.495018839, 3.16693484), (0.33425049, 2.880359605), (0.030324762, 2.755455725))
        make_face()
    extrude(amount=FILLET_1_DEPTH, mode=Mode.SUBTRACT)

    # Fillet 1 2 outline → Fillet 1 2 (cut)
    with BuildSketch(Plane(origin=(0, 0, 0), x_dir=(1, 0, 0), z_dir=(0, 1, 0)).offset(FILLET_START_2)):
        with BuildLine():
            ThreePointArc((-9.025231073, 16.77027027), (-8.844222736, 16.938825213), (-8.604572089, 17))
            Line((-8.604572089, 17), (-8.874701271, 17))
            ThreePointArc((-8.874701271, 17), (-8.950481675, 16.885472917), (-9.025231073, 16.77027027))
        make_face()
        with BuildLine():
            ThreePointArc((-8.604572089, 0), (-8.844222736, 0.061174787), (-9.025231073, 0.22972973))
            ThreePointArc((-9.025231073, 0.22972973), (-8.950481675, 0.114527083), (-8.874701271, 0))
            Line((-8.874701271, 0), (-8.604572089, 0))
        make_face()
        with BuildLine():
            ThreePointArc((-1.08403646, 0.451633648), (-1.262452429, 0.10463646), (-1.635863903, -0.00851467))
            ThreePointArc((-1.635863903, -0.00851467), (-1.25040696, -0.102532593), (-0.903083615, -0.294321327))
            ThreePointArc((-0.903083615, -0.294321327), (-1.052235792, 0.064422668), (-1.08403646, 0.451633648))
        make_face()
        with BuildLine():
            ThreePointArc((0.884565826, 1.379477291), (0.660848396, 1.77945859), (0.517239852, 2.214672463))
            ThreePointArc((0.517239852, 2.214672463), (0.431918135, 1.807119305), (0.067603665, 1.605490092))
            ThreePointArc((0.067603665, 1.605490092), (0.49582743, 1.563847021), (0.884565826, 1.379477291))
        make_face()
    extrude(amount=FILLET_1_2_DEPTH, mode=Mode.SUBTRACT)

    # Fillet 1 3 outline → Fillet 1 3 (cut)
    with BuildSketch(Plane(origin=(0, 0, 0), x_dir=(1, 0, 0), z_dir=(0, 1, 0)).offset(FILLET_START_3)):
        with BuildLine():
            ThreePointArc((-9.025231073, 16.77027027), (-8.844222736, 16.938825213), (-8.604572089, 17))
            Line((-8.604572089, 17), (-8.874701271, 17))
            ThreePointArc((-8.874701271, 17), (-8.950481675, 16.885472917), (-9.025231073, 16.77027027))
        make_face()
        with BuildLine():
            ThreePointArc((-8.604572089, 0), (-8.844222736, 0.061174787), (-9.025231073, 0.22972973))
            ThreePointArc((-9.025231073, 0.22972973), (-8.950481675, 0.114527083), (-8.874701271, 0))
            Line((-8.874701271, 0), (-8.604572089, 0))
        make_face()
    extrude(amount=FILLET_1_3_DEPTH, mode=Mode.SUBTRACT)

    # Fillet 1 4 outline → Fillet 1 4 (cut)
    with BuildSketch(Plane(origin=(0, 0, 0), x_dir=(1, 0, 0), z_dir=(0, 1, 0)).offset(FILLET_START_4)):
        with BuildLine():
            ThreePointArc((0.963003545, 14.4188922), (0.96158445, 14.49585524), (0.961482029, 14.572831294))
            ThreePointArc((0.961482029, 14.572831294), (0.937837832, 14.424463631), (0.871185578, 14.289817841))
            ThreePointArc((0.871185578, 14.289817841), (0.916841519, 14.354535024), (0.963003545, 14.4188922))
        make_face()
        with BuildLine():
            ThreePointArc((0.42008242, 3.415507477), (0.478926522, 3.25893209), (0.482835834, 3.091710089))
            ThreePointArc((0.482835834, 3.091710089), (0.496570271, 3.175545649), (0.513263178, 3.258842605))
            ThreePointArc((0.513263178, 3.258842605), (0.466319363, 3.336964825), (0.42008242, 3.415507477))
        make_face()
    extrude(amount=FILLET_1_4_DEPTH, mode=Mode.SUBTRACT)


solid = part.part
